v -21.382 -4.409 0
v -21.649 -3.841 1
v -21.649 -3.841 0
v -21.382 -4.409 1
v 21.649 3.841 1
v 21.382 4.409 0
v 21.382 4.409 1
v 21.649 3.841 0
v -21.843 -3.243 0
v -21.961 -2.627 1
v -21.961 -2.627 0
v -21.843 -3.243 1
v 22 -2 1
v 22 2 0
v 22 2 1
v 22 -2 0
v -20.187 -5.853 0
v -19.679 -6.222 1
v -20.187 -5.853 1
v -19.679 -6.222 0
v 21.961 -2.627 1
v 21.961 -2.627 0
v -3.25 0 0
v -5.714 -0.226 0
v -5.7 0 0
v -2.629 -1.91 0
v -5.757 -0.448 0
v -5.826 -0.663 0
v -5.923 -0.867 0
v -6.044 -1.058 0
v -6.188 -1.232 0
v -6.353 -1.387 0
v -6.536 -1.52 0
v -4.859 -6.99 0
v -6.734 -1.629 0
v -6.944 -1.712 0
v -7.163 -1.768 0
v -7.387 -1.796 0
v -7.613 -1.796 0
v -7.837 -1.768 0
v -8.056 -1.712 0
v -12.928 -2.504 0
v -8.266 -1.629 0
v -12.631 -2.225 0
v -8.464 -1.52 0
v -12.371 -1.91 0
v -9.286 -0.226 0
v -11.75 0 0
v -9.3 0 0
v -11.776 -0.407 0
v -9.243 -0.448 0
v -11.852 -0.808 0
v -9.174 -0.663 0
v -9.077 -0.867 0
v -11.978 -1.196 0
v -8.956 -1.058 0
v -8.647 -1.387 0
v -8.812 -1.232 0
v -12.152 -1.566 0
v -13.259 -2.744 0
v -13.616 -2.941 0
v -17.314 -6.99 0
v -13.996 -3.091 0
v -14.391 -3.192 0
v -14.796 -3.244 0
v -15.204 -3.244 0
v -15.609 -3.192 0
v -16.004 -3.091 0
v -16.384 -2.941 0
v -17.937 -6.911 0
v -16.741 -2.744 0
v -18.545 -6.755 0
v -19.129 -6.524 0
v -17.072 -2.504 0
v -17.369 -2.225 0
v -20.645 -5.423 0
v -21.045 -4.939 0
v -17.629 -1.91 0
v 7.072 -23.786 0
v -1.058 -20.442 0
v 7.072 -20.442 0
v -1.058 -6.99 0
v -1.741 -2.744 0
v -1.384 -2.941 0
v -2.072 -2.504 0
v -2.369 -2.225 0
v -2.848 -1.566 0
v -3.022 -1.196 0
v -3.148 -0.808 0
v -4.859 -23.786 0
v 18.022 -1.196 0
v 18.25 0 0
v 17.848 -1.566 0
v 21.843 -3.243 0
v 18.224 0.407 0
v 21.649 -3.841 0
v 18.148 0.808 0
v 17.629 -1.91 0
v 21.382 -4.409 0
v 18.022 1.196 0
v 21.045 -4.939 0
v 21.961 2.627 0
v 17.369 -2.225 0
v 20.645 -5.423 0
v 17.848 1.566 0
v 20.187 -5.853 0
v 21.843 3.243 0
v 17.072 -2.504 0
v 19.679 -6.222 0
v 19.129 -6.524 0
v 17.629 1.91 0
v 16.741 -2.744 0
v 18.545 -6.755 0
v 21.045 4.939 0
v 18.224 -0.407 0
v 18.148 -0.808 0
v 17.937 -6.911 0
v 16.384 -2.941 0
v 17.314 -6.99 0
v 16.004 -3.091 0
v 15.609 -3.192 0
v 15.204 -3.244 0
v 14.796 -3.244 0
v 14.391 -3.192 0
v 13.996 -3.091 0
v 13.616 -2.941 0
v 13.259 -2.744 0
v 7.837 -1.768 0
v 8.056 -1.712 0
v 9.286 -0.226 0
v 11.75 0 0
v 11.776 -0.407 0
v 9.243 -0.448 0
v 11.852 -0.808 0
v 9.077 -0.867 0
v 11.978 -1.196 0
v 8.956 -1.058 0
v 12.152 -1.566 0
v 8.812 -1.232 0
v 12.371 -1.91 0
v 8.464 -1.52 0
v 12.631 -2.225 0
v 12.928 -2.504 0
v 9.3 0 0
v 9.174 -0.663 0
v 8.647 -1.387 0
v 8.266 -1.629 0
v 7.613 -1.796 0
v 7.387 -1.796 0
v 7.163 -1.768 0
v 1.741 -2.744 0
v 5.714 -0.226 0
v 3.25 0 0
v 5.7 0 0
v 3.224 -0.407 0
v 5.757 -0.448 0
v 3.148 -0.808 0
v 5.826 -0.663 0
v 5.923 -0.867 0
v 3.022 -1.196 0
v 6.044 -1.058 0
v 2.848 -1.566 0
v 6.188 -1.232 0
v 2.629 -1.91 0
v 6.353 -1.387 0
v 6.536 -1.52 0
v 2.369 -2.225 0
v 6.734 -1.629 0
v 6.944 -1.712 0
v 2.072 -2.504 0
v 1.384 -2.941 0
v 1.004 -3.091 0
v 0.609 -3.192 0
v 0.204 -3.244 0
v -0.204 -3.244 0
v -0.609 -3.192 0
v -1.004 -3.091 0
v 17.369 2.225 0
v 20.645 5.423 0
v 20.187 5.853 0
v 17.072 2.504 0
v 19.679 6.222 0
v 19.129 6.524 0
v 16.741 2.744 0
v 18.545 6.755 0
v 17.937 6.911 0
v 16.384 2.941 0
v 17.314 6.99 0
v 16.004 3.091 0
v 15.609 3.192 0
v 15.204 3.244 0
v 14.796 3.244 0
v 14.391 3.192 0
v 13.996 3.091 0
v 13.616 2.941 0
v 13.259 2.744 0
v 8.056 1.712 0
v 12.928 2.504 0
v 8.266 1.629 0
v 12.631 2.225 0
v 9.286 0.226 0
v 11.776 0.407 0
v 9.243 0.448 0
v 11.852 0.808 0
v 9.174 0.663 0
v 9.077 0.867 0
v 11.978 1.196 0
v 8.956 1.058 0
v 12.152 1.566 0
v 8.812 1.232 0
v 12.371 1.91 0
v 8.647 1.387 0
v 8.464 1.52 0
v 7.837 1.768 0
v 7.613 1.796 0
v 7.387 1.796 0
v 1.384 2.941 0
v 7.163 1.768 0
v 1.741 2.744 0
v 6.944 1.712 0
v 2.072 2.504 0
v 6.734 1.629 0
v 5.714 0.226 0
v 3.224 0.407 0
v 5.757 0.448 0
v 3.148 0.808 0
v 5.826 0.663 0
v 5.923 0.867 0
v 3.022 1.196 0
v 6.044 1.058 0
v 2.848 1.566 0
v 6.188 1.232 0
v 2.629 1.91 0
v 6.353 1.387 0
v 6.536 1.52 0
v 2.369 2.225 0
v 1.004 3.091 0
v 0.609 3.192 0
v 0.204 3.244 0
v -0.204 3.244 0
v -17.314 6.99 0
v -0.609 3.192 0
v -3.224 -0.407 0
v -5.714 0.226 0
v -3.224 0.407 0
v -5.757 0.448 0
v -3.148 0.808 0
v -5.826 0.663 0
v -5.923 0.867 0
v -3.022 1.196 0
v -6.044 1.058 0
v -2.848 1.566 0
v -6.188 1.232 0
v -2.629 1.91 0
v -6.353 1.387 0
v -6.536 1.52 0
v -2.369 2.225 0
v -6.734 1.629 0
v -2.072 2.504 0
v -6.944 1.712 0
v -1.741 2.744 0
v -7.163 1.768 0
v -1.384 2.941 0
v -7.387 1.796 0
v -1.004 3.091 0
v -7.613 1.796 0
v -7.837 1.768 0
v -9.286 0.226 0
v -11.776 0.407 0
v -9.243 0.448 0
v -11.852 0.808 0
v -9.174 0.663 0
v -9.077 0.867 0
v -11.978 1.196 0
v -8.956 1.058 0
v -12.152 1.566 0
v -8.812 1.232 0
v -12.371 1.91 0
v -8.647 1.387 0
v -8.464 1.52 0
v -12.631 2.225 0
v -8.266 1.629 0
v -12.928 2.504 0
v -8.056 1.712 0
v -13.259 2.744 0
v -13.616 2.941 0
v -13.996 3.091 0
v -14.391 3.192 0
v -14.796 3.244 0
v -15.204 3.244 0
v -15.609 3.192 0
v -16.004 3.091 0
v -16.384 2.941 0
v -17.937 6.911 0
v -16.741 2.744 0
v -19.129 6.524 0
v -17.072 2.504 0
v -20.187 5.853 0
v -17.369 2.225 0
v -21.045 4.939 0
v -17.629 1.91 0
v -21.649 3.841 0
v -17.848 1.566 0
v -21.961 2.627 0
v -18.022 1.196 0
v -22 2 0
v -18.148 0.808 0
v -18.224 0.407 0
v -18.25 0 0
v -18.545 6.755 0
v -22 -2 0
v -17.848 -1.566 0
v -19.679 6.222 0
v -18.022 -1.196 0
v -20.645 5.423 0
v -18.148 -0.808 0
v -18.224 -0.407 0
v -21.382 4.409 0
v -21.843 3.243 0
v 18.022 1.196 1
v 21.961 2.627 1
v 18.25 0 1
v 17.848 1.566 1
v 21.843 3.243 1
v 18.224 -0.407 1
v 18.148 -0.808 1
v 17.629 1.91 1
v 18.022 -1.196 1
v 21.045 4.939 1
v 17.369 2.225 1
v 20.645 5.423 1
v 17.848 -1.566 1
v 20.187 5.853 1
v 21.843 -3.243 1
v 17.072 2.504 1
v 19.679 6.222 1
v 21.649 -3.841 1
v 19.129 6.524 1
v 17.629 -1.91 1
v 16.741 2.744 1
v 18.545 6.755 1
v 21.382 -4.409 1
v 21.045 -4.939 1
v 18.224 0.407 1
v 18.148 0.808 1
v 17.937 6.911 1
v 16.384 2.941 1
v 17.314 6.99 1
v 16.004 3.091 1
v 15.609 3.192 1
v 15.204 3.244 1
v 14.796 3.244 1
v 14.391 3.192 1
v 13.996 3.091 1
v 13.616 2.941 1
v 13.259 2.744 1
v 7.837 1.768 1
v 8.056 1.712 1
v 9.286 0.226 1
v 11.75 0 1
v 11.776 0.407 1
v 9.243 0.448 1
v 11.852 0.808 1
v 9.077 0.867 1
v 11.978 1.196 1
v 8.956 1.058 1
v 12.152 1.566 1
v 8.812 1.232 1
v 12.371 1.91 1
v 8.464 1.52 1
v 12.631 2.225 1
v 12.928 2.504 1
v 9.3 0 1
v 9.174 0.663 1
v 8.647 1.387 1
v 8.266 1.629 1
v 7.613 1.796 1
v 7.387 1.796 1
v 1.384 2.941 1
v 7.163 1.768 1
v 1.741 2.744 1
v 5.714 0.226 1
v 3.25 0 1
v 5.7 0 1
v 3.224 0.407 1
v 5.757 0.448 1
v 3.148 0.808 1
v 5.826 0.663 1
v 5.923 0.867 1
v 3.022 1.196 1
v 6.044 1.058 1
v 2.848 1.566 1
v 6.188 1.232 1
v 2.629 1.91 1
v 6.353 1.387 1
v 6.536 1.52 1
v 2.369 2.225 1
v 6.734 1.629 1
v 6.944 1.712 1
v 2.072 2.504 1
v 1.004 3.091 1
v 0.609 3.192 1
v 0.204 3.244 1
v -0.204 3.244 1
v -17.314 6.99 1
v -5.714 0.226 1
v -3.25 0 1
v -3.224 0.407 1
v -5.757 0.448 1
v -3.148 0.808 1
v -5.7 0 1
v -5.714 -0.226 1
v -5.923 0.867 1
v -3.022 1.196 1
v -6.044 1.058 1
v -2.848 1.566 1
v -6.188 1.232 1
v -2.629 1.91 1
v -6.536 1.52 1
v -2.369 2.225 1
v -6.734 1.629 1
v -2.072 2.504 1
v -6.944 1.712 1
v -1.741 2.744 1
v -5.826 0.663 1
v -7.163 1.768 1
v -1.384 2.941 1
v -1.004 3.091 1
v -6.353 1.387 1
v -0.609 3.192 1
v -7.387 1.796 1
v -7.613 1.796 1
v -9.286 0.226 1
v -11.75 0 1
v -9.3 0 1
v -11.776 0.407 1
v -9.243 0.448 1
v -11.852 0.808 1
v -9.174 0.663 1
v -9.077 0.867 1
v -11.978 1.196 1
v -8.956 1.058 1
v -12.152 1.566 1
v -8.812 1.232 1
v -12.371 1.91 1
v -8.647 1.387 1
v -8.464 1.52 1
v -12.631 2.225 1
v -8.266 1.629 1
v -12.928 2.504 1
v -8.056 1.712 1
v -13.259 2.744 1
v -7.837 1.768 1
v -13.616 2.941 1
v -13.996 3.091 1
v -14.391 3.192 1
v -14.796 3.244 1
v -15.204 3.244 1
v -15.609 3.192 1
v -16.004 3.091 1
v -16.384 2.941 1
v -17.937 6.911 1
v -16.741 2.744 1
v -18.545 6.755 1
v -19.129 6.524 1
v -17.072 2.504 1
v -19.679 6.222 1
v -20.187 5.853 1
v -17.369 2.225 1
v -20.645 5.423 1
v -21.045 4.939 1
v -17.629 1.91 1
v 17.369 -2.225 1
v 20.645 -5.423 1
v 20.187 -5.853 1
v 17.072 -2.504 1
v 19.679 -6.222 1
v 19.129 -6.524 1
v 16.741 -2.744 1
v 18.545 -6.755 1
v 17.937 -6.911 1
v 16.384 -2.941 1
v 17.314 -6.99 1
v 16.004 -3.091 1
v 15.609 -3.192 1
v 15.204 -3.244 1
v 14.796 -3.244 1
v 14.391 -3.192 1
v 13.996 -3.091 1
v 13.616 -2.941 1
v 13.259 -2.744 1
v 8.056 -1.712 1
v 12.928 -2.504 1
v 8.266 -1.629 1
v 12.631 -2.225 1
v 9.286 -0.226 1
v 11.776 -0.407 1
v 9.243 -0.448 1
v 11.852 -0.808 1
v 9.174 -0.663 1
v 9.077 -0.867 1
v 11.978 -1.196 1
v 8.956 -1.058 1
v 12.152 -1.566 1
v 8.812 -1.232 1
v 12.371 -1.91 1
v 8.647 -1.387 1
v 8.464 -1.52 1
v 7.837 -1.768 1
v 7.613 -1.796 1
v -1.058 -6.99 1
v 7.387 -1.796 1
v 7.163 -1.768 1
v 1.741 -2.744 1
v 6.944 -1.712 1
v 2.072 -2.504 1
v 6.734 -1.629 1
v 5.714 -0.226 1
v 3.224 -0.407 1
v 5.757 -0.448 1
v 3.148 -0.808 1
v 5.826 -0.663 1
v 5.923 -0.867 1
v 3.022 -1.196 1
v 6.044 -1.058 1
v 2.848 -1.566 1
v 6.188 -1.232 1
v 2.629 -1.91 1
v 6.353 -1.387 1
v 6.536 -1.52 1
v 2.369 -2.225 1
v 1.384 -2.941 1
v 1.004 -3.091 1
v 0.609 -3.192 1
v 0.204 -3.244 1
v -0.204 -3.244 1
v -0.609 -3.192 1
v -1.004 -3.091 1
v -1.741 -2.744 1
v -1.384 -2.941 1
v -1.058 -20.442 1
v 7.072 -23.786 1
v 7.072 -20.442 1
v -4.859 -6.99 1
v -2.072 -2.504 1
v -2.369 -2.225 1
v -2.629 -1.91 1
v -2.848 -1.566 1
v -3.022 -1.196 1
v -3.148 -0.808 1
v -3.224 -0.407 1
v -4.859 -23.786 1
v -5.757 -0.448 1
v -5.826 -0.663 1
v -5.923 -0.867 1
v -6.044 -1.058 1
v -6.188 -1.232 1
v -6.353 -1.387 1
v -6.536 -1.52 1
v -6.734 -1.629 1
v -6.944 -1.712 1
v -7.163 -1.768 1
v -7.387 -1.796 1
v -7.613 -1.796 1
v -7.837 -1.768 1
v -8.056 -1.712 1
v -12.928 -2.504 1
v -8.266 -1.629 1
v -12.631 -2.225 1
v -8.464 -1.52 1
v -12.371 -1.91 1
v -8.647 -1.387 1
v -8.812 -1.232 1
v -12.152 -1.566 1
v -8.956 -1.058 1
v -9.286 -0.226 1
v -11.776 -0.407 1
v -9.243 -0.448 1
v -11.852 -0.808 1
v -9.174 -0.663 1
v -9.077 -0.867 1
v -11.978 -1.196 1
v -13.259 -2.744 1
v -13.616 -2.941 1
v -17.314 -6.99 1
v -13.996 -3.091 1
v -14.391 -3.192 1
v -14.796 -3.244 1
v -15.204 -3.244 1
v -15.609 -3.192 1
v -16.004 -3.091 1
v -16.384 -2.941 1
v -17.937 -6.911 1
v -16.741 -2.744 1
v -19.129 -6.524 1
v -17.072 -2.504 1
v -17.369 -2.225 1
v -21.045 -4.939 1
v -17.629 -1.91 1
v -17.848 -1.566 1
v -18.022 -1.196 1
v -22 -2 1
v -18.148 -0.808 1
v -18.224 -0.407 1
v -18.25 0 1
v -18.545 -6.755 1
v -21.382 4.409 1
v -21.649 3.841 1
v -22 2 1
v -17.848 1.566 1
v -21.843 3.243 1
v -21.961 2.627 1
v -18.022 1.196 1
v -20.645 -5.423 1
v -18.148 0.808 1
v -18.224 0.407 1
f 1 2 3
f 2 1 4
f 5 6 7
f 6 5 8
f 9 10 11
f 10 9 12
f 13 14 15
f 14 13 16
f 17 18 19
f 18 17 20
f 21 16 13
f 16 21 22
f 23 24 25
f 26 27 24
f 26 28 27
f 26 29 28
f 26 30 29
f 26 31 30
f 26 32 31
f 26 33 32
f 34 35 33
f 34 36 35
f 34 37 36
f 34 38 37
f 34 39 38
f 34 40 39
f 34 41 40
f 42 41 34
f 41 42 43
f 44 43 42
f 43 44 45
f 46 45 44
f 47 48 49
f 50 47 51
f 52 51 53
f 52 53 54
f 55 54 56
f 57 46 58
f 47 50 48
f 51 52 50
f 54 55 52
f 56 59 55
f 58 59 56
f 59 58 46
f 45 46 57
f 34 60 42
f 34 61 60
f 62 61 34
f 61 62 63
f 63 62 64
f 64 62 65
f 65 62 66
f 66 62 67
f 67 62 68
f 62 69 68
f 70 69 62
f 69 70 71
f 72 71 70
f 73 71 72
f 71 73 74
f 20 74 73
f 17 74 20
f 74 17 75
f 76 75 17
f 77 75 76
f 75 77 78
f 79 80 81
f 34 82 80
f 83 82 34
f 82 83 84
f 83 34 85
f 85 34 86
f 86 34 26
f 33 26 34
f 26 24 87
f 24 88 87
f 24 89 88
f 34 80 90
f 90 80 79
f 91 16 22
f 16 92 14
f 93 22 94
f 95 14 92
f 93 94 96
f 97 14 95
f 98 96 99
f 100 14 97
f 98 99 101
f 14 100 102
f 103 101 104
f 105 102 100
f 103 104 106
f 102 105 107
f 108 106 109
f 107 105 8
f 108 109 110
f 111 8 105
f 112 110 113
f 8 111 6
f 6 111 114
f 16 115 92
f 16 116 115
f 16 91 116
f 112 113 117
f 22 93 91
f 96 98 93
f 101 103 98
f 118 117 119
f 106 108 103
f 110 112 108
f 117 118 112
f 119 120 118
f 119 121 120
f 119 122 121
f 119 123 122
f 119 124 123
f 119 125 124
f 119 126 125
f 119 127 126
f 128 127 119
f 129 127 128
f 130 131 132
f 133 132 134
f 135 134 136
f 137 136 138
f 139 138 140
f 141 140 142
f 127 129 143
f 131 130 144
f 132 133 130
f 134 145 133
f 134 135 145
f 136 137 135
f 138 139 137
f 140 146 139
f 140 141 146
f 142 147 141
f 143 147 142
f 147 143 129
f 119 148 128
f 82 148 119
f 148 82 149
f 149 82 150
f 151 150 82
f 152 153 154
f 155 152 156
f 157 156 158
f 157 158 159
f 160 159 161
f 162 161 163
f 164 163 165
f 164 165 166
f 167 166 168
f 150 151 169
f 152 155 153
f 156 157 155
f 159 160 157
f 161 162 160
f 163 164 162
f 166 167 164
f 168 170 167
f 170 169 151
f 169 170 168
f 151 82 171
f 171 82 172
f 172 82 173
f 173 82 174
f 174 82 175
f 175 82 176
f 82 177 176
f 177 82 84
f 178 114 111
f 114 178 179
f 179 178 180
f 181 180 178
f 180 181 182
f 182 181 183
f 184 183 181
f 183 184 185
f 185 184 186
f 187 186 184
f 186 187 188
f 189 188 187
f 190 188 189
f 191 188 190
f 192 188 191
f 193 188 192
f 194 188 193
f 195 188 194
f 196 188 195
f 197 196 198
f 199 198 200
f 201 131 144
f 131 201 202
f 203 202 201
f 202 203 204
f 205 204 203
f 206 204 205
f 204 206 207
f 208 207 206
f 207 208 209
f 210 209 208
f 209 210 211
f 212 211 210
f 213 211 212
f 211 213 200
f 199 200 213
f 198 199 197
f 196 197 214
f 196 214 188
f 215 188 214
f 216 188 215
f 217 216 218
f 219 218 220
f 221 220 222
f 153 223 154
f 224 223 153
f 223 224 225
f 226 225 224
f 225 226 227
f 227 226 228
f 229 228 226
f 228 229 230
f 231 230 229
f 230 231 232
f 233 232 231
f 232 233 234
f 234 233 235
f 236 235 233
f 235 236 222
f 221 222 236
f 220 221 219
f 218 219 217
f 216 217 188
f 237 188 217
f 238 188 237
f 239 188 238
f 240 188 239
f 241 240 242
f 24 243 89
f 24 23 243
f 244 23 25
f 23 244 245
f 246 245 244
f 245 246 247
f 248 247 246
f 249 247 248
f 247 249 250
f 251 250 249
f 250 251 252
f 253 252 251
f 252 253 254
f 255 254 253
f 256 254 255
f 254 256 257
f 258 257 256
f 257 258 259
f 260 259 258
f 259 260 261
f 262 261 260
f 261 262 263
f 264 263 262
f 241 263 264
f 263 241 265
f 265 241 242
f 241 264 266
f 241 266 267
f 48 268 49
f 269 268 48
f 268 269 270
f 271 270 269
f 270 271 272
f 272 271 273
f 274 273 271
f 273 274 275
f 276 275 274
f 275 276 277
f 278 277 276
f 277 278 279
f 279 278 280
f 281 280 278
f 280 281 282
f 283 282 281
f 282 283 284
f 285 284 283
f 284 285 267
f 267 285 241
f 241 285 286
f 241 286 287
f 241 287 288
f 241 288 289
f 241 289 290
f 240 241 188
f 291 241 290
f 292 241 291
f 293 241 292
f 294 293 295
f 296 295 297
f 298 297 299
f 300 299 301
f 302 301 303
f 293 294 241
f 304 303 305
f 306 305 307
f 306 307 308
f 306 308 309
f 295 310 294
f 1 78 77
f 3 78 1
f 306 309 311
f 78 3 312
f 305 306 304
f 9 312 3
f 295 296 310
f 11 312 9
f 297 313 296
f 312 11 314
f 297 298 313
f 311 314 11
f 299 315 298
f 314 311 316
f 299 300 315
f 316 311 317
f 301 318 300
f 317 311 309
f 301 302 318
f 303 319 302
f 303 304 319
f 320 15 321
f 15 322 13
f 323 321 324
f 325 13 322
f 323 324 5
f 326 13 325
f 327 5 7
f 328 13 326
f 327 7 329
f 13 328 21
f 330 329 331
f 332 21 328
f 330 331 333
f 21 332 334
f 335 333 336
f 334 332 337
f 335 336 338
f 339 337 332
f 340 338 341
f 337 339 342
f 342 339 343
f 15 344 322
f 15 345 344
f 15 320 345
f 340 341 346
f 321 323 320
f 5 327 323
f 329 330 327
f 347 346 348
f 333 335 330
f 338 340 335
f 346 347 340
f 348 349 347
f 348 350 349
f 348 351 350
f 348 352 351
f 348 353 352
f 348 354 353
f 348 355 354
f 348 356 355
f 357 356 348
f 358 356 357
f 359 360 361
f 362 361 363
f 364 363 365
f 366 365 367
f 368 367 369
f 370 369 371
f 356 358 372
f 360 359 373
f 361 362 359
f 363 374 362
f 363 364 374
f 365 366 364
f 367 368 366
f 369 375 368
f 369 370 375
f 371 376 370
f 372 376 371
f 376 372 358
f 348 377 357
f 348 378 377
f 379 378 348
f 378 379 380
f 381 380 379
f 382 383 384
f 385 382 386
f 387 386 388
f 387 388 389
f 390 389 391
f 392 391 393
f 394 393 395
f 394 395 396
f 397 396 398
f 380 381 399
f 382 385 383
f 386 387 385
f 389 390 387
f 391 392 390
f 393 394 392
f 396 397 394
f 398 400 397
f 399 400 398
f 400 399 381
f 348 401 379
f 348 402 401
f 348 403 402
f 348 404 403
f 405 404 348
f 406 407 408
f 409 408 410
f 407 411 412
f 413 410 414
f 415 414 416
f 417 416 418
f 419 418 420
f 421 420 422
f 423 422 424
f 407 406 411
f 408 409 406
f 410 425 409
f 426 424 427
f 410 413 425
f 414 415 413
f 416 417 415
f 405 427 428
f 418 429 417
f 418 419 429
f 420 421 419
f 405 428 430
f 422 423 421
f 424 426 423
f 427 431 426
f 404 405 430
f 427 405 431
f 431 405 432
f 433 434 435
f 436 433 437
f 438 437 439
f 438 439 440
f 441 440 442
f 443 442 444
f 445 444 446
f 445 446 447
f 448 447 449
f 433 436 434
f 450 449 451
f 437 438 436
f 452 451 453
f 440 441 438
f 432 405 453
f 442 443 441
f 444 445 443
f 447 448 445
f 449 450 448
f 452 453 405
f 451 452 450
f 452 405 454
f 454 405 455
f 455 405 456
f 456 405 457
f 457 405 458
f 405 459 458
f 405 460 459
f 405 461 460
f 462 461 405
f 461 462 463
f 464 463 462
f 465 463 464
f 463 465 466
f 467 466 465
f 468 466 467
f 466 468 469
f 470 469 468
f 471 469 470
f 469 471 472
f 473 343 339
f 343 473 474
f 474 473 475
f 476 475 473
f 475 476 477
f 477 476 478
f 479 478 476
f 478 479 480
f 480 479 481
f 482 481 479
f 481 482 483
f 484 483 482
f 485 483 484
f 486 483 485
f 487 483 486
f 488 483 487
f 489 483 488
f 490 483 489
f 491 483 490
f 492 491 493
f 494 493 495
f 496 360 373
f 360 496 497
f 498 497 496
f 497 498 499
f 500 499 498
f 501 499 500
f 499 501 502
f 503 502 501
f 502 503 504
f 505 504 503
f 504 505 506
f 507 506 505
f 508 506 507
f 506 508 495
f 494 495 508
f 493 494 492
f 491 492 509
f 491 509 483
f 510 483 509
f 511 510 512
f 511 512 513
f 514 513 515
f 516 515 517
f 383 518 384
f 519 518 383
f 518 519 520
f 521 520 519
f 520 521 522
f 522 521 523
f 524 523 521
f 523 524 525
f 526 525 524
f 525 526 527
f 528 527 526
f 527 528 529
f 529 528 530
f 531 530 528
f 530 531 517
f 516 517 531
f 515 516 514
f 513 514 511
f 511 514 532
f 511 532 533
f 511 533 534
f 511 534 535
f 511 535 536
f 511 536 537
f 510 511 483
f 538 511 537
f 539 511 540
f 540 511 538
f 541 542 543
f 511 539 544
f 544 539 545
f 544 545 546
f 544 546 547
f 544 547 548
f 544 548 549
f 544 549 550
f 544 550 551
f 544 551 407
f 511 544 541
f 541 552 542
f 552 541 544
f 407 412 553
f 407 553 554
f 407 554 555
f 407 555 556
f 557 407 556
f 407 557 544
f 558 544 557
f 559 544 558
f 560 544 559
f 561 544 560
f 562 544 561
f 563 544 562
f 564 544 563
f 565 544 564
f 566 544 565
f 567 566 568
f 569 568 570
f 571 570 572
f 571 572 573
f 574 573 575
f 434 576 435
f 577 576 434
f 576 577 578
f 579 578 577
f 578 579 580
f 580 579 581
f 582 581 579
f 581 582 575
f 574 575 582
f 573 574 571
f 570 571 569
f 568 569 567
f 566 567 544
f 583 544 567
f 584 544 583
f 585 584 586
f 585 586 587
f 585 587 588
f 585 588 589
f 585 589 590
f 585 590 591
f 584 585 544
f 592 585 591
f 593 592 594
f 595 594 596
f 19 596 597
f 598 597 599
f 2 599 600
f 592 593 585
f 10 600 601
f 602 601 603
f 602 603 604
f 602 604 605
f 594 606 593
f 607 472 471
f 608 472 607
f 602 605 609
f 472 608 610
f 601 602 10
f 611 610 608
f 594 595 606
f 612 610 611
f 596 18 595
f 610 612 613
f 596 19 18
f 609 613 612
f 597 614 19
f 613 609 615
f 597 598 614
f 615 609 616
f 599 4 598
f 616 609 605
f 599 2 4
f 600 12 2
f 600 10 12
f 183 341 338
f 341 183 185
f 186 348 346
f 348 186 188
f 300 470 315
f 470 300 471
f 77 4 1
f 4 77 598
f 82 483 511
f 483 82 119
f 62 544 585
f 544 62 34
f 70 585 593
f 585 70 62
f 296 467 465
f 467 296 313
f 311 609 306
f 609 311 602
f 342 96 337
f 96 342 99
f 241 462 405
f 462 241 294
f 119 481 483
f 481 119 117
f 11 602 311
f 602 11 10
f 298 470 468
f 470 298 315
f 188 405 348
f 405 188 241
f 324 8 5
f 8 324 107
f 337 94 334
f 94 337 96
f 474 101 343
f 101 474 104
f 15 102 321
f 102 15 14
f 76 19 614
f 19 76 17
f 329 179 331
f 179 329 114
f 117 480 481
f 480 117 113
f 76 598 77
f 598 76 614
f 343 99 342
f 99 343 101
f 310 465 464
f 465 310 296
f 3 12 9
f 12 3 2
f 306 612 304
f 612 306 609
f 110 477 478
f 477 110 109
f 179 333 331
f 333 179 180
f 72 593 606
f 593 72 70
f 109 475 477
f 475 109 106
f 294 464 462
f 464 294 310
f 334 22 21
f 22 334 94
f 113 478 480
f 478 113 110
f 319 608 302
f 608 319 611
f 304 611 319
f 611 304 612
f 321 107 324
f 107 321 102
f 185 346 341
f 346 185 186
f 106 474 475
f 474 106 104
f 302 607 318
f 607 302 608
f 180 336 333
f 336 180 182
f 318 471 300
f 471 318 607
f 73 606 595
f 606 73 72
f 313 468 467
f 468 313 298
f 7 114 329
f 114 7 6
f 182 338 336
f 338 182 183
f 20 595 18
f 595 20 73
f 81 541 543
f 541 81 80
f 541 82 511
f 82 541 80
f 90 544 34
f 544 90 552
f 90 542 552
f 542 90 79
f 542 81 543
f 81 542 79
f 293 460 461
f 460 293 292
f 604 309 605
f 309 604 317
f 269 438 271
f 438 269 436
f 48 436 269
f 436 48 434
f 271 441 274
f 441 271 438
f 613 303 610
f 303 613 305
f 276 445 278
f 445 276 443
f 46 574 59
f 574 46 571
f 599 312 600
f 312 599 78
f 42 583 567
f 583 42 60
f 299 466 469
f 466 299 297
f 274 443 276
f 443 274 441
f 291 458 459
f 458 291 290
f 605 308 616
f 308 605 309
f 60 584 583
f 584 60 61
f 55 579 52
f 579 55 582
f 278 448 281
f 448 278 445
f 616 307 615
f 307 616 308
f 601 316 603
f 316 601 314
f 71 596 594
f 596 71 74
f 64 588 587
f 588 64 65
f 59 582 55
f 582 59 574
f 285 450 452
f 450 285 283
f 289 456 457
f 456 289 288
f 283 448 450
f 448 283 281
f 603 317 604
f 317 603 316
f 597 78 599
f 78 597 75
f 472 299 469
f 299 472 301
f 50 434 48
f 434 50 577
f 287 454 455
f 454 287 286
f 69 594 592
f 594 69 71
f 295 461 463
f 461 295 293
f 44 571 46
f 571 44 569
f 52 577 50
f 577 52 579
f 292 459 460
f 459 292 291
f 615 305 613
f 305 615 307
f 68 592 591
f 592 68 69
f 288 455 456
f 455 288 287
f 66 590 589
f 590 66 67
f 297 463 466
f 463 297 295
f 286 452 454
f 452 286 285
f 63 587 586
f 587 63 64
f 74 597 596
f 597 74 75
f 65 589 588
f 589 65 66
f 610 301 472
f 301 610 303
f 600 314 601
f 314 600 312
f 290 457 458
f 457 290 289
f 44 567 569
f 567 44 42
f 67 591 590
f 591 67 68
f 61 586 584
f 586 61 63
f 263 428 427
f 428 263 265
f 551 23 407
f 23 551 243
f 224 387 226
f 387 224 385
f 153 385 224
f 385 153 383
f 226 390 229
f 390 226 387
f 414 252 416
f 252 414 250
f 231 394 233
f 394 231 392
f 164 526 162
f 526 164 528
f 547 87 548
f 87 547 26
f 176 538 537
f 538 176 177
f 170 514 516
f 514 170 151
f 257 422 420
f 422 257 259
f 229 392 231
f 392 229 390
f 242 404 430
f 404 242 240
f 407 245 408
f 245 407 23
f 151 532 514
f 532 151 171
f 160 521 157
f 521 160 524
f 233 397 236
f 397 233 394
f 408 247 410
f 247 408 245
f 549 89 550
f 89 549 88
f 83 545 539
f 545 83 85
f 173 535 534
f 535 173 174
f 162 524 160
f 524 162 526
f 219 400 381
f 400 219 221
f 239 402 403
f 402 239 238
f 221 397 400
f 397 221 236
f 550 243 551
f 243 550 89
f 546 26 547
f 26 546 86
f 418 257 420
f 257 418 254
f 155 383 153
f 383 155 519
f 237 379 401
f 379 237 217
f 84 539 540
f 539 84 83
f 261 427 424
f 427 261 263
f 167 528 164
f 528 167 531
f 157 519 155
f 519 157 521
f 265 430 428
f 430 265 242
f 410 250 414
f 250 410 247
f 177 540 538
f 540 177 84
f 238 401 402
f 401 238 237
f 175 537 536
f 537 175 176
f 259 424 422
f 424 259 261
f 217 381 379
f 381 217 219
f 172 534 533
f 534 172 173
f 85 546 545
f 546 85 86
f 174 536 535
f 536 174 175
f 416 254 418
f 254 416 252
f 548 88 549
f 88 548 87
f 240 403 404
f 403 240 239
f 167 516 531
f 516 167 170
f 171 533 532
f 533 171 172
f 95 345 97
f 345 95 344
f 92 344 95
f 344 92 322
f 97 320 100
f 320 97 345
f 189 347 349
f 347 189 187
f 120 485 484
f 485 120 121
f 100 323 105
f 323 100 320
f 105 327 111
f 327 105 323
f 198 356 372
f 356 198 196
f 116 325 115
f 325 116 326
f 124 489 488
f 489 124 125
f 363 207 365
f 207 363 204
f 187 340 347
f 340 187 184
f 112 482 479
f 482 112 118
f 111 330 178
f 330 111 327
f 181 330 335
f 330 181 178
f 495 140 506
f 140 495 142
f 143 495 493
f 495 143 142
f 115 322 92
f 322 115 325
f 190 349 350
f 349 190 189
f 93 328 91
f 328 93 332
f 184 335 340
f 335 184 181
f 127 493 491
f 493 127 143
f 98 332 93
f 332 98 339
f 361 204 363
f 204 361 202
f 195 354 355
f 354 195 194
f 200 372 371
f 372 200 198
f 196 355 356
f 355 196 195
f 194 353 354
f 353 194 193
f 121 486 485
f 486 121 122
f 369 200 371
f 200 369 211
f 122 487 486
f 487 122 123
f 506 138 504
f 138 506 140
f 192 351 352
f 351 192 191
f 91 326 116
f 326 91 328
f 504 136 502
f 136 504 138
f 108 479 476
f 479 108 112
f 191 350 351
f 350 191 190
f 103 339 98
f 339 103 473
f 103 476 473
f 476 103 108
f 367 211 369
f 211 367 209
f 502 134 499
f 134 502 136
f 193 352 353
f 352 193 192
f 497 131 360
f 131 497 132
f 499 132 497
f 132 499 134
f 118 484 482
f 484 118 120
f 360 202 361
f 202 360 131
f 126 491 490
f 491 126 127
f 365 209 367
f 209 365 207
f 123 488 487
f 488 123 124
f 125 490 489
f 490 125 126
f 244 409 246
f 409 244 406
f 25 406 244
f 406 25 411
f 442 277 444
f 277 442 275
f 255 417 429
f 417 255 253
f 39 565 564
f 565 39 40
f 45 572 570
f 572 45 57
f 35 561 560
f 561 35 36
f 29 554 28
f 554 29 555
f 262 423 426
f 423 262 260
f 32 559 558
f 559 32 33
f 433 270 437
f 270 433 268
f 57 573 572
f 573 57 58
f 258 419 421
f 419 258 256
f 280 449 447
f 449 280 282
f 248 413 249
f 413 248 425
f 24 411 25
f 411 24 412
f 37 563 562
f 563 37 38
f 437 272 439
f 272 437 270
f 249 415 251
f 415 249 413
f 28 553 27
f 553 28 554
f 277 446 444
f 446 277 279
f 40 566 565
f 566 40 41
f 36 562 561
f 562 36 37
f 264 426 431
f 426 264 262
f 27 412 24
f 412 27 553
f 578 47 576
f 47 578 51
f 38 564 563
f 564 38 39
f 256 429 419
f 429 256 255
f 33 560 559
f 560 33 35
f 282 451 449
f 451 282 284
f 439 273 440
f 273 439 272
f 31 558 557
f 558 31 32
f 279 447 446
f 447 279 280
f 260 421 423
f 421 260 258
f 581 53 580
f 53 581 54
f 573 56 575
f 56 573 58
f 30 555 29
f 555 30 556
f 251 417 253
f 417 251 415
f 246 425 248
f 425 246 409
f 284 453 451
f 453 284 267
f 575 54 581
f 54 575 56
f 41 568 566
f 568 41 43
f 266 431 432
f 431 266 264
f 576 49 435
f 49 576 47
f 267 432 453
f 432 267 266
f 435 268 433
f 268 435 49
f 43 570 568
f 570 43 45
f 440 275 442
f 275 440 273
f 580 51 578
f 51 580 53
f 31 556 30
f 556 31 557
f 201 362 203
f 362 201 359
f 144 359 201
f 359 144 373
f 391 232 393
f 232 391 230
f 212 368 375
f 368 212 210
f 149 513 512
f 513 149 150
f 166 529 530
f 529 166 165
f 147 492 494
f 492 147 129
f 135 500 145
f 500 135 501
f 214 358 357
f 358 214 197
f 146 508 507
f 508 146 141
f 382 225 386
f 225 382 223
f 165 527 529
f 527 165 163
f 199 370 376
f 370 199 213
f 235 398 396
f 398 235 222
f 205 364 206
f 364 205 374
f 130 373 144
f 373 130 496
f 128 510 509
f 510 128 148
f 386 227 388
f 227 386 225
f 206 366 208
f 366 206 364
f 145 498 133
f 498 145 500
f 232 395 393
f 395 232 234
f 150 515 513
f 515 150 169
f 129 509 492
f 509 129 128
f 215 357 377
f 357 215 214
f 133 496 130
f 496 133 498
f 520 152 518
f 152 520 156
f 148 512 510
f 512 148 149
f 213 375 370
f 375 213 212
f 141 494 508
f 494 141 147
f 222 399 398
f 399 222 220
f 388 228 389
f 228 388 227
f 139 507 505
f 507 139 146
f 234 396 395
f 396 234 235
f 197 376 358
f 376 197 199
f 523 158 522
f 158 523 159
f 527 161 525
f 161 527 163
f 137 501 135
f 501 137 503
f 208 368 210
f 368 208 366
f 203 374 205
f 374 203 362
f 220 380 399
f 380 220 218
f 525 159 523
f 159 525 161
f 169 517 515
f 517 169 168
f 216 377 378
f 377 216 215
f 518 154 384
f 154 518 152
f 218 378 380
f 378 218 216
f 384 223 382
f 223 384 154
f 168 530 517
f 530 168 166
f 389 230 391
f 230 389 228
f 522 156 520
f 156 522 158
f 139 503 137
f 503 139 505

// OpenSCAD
$fn = 50;


difference() {
	union() {
		*color(alpha = 1.0000000000, c = "gray") {
			translate(v = [0, 14, 0]) {
				linear_extrude(height = 1) {
					text(font = "Arial:style=Bold", halign = "center", size = 4.5000000000, text = "COMMENT description oobb_plate_shape_p_type_1_depth_3_width_1_thickness_l_extra_oobb_size", valign = "center");
				}
			}
		}
		hull() {
			translate(v = [-17.0000000000, 2.0000000000, 0]) {
				cylinder(h = 1, r = 5);
			}
			translate(v = [17.0000000000, 2.0000000000, 0]) {
				cylinder(h = 1, r = 5);
			}
			translate(v = [-17.0000000000, -2.0000000000, 0]) {
				cylinder(h = 1, r = 5);
			}
			translate(v = [17.0000000000, -2.0000000000, 0]) {
				cylinder(h = 1, r = 5);
			}
		}
		translate(v = [0, -5, 0]) {
			linear_extrude(height = 1) {
				text(font = "DejaVu Sans Mono:style=Bold", halign = "center", size = 19.0000000000, text = "L", valign = "top");
			}
		}
	}
	union() {
		*color(alpha = 1.0000000000, c = "gray") {
			translate(v = [0, 14, 0]) {
				linear_extrude(height = 1) {
					text(font = "Arial:style=Bold", halign = "center", size = 4.5000000000, text = "COMMENT description oobb_holes_shape_n_type_3_width_1_thickness_l_extra_oobb_size_1_height_'all'_holes_true_both_holes", valign = "center");
				}
			}
		}
		translate(v = [-15.0000000000, 0.0000000000, 0]) {
			translate(v = [0, 0, -50]) {
				cylinder(h = 100, r = 3.2500000000);
			}
		}
		translate(v = [0, 0, -50]) {
			cylinder(h = 100, r = 3.2500000000);
		}
		translate(v = [15.0000000000, 0.0000000000, 0]) {
			translate(v = [0, 0, -50]) {
				cylinder(h = 100, r = 3.2500000000);
			}
		}
		translate(v = [-15.0000000000, 0.0000000000, 0]) {
			translate(v = [0, 0, -50]) {
				cylinder(h = 100, r = 1.8000000000);
			}
		}
		translate(v = [-7.5000000000, 0.0000000000, 0]) {
			translate(v = [0, 0, -50]) {
				cylinder(h = 100, r = 1.8000000000);
			}
		}
		translate(v = [0, 0, -50]) {
			cylinder(h = 100, r = 1.8000000000);
		}
		translate(v = [7.5000000000, 0.0000000000, 0]) {
			translate(v = [0, 0, -50]) {
				cylinder(h = 100, r = 1.8000000000);
			}
		}
		translate(v = [15.0000000000, 0.0000000000, 0]) {
			translate(v = [0, 0, -50]) {
				cylinder(h = 100, r = 1.8000000000);
			}
		}
	}
}
